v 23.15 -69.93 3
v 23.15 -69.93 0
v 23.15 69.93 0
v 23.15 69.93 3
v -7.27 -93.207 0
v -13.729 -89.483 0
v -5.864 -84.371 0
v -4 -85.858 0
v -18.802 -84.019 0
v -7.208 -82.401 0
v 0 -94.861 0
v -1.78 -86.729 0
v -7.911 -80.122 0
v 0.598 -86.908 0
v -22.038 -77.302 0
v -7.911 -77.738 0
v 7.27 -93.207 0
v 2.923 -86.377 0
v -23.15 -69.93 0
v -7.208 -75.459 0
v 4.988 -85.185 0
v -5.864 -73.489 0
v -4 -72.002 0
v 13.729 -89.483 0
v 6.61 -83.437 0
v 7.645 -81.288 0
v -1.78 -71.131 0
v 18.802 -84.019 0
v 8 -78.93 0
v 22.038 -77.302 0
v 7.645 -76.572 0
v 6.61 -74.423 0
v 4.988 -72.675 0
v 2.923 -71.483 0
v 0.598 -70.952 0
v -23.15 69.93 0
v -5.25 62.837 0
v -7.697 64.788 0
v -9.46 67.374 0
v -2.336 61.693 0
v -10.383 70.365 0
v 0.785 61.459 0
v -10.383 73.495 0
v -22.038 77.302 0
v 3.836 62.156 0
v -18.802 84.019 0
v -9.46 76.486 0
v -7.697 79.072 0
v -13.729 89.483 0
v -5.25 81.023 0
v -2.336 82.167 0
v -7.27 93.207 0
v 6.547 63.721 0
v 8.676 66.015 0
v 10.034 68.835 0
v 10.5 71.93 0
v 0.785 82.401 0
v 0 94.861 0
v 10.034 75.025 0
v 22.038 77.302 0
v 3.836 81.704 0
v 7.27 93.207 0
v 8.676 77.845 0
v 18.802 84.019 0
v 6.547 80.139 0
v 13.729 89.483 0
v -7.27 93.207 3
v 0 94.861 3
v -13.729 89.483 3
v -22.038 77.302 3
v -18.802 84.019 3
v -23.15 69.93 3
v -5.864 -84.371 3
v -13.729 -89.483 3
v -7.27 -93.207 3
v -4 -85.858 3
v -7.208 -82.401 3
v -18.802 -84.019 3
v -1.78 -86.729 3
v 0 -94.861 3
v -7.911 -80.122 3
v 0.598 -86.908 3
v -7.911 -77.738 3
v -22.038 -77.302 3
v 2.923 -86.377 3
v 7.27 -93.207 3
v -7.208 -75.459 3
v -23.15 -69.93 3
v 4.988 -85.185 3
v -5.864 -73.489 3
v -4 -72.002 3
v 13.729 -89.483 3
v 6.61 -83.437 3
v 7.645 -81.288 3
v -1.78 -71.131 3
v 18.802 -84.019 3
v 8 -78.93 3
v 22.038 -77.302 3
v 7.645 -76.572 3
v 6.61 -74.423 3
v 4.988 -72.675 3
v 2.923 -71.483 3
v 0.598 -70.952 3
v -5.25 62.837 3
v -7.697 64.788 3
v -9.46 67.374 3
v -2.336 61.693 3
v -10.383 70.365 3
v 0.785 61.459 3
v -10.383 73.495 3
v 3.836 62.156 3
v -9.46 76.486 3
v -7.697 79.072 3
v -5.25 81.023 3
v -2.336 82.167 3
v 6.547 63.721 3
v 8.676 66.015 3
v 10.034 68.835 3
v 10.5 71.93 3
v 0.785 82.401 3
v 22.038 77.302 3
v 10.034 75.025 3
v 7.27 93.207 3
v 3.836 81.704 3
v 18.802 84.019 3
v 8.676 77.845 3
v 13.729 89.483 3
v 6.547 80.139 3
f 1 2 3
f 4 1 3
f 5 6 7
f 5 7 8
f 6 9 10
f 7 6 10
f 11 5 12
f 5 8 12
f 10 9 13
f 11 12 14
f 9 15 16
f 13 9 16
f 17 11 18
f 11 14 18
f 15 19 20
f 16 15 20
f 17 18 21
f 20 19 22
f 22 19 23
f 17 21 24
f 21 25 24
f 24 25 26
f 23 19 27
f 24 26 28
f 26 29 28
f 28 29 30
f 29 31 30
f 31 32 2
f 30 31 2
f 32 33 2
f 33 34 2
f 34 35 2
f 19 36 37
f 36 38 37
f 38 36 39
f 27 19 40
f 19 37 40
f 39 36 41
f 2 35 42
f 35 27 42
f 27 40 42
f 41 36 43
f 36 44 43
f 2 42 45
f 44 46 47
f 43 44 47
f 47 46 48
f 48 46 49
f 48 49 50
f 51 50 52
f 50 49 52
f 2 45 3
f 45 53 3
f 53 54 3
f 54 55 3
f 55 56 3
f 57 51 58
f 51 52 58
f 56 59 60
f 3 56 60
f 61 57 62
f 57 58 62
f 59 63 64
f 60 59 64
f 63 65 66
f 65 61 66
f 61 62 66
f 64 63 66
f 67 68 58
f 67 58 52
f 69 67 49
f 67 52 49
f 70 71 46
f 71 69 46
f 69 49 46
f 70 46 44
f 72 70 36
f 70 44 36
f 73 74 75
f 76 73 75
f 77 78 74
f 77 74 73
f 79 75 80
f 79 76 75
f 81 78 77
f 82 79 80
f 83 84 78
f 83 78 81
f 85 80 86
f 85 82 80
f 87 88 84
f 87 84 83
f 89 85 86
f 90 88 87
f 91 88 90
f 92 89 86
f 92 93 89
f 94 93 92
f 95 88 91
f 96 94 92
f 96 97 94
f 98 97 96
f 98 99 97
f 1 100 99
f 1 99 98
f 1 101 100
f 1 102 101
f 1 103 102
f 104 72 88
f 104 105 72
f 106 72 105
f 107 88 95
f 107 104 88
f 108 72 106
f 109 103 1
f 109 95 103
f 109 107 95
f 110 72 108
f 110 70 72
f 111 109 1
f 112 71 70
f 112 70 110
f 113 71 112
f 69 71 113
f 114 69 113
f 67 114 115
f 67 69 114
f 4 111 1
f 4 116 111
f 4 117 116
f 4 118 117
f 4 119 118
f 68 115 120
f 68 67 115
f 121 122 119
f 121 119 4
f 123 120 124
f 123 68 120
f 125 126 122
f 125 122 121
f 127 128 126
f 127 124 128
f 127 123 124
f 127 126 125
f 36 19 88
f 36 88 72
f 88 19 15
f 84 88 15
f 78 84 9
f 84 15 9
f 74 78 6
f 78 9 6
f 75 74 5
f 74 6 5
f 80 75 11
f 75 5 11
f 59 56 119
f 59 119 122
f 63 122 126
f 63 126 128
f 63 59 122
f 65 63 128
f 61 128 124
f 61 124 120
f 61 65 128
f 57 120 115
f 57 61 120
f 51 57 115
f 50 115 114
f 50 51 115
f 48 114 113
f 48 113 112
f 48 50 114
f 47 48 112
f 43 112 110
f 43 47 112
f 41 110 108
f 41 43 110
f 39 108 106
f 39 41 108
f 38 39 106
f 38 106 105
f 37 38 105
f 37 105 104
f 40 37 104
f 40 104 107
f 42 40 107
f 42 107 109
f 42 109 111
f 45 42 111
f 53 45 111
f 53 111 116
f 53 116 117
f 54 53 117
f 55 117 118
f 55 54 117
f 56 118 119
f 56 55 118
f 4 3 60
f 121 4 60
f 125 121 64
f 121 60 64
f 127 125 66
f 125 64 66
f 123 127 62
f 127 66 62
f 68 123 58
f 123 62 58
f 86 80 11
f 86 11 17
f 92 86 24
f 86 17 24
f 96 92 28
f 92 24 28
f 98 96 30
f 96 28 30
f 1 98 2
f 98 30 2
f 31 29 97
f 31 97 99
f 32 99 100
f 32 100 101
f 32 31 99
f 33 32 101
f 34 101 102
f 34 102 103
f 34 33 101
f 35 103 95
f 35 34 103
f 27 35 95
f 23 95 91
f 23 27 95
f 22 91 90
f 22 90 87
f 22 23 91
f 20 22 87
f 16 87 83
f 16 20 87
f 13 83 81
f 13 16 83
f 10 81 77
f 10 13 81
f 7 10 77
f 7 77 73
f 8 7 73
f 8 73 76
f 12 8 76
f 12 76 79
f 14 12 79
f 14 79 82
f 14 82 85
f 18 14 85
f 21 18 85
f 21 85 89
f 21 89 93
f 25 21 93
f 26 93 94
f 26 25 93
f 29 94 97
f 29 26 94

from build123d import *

# Parameters (mm, degrees)
SKETCH1_W           = 46.3
SKETCH1_H           = 189.86
SKETCH1_R           = 10.5
SKETCH1_R_2         = 8
BOSS_EXTRUDE1_DEPTH = 3
FILLET1_R           = 25


with BuildPart() as part:
    # Sketch1 → Boss-Extrude1 (new body)
    with BuildSketch(Plane.XY):
        Rectangle(SKETCH1_W, SKETCH1_H)
        with Locations((0, 71.93)):
            Circle(SKETCH1_R, mode=Mode.SUBTRACT)
        with Locations((0, -78.93)):
            Circle(SKETCH1_R_2, mode=Mode.SUBTRACT)
    extrude(amount=BOSS_EXTRUDE1_DEPTH)

    # Fillet1
    # the kernel refuses this fillet: 25 mm, written as the material it takes off along each edge
    with BuildSketch(Plane(origin=(23.15, -94.93, -62.5), x_dir=(-1, 0, 0), z_dir=(0, 0, 1))) as fillet1_piece_1:
        with BuildLine():
            CenterArc((FILLET1_R, -FILLET1_R), FILLET1_R, 90, 90)
            Line((0, -FILLET1_R), (0, 0))
            Line((0, 0), (FILLET1_R, 0))
        make_face()
    extrude(amount=128, mode=Mode.SUBTRACT)
    with BuildSketch(Plane(origin=(-23.15, -94.93, -62.5), x_dir=(1, 0, 0), z_dir=(0, 0, 1)), Plane(origin=(-23.15, 94.93, -62.5), x_dir=(0, -1, 0), z_dir=(0, 0, 1)), Plane(origin=(23.15, 94.93, -62.5), x_dir=(-1, 0, 0), z_dir=(0, 0, 1))) as fillet1_piece_2:
        with BuildLine():
            CenterArc((FILLET1_R, FILLET1_R), FILLET1_R, 180, 90)
            Line((0, FILLET1_R), (0, 0))
            Line((0, 0), (FILLET1_R, 0))
        make_face()
    extrude(amount=128, mode=Mode.SUBTRACT)


solid = part.part
